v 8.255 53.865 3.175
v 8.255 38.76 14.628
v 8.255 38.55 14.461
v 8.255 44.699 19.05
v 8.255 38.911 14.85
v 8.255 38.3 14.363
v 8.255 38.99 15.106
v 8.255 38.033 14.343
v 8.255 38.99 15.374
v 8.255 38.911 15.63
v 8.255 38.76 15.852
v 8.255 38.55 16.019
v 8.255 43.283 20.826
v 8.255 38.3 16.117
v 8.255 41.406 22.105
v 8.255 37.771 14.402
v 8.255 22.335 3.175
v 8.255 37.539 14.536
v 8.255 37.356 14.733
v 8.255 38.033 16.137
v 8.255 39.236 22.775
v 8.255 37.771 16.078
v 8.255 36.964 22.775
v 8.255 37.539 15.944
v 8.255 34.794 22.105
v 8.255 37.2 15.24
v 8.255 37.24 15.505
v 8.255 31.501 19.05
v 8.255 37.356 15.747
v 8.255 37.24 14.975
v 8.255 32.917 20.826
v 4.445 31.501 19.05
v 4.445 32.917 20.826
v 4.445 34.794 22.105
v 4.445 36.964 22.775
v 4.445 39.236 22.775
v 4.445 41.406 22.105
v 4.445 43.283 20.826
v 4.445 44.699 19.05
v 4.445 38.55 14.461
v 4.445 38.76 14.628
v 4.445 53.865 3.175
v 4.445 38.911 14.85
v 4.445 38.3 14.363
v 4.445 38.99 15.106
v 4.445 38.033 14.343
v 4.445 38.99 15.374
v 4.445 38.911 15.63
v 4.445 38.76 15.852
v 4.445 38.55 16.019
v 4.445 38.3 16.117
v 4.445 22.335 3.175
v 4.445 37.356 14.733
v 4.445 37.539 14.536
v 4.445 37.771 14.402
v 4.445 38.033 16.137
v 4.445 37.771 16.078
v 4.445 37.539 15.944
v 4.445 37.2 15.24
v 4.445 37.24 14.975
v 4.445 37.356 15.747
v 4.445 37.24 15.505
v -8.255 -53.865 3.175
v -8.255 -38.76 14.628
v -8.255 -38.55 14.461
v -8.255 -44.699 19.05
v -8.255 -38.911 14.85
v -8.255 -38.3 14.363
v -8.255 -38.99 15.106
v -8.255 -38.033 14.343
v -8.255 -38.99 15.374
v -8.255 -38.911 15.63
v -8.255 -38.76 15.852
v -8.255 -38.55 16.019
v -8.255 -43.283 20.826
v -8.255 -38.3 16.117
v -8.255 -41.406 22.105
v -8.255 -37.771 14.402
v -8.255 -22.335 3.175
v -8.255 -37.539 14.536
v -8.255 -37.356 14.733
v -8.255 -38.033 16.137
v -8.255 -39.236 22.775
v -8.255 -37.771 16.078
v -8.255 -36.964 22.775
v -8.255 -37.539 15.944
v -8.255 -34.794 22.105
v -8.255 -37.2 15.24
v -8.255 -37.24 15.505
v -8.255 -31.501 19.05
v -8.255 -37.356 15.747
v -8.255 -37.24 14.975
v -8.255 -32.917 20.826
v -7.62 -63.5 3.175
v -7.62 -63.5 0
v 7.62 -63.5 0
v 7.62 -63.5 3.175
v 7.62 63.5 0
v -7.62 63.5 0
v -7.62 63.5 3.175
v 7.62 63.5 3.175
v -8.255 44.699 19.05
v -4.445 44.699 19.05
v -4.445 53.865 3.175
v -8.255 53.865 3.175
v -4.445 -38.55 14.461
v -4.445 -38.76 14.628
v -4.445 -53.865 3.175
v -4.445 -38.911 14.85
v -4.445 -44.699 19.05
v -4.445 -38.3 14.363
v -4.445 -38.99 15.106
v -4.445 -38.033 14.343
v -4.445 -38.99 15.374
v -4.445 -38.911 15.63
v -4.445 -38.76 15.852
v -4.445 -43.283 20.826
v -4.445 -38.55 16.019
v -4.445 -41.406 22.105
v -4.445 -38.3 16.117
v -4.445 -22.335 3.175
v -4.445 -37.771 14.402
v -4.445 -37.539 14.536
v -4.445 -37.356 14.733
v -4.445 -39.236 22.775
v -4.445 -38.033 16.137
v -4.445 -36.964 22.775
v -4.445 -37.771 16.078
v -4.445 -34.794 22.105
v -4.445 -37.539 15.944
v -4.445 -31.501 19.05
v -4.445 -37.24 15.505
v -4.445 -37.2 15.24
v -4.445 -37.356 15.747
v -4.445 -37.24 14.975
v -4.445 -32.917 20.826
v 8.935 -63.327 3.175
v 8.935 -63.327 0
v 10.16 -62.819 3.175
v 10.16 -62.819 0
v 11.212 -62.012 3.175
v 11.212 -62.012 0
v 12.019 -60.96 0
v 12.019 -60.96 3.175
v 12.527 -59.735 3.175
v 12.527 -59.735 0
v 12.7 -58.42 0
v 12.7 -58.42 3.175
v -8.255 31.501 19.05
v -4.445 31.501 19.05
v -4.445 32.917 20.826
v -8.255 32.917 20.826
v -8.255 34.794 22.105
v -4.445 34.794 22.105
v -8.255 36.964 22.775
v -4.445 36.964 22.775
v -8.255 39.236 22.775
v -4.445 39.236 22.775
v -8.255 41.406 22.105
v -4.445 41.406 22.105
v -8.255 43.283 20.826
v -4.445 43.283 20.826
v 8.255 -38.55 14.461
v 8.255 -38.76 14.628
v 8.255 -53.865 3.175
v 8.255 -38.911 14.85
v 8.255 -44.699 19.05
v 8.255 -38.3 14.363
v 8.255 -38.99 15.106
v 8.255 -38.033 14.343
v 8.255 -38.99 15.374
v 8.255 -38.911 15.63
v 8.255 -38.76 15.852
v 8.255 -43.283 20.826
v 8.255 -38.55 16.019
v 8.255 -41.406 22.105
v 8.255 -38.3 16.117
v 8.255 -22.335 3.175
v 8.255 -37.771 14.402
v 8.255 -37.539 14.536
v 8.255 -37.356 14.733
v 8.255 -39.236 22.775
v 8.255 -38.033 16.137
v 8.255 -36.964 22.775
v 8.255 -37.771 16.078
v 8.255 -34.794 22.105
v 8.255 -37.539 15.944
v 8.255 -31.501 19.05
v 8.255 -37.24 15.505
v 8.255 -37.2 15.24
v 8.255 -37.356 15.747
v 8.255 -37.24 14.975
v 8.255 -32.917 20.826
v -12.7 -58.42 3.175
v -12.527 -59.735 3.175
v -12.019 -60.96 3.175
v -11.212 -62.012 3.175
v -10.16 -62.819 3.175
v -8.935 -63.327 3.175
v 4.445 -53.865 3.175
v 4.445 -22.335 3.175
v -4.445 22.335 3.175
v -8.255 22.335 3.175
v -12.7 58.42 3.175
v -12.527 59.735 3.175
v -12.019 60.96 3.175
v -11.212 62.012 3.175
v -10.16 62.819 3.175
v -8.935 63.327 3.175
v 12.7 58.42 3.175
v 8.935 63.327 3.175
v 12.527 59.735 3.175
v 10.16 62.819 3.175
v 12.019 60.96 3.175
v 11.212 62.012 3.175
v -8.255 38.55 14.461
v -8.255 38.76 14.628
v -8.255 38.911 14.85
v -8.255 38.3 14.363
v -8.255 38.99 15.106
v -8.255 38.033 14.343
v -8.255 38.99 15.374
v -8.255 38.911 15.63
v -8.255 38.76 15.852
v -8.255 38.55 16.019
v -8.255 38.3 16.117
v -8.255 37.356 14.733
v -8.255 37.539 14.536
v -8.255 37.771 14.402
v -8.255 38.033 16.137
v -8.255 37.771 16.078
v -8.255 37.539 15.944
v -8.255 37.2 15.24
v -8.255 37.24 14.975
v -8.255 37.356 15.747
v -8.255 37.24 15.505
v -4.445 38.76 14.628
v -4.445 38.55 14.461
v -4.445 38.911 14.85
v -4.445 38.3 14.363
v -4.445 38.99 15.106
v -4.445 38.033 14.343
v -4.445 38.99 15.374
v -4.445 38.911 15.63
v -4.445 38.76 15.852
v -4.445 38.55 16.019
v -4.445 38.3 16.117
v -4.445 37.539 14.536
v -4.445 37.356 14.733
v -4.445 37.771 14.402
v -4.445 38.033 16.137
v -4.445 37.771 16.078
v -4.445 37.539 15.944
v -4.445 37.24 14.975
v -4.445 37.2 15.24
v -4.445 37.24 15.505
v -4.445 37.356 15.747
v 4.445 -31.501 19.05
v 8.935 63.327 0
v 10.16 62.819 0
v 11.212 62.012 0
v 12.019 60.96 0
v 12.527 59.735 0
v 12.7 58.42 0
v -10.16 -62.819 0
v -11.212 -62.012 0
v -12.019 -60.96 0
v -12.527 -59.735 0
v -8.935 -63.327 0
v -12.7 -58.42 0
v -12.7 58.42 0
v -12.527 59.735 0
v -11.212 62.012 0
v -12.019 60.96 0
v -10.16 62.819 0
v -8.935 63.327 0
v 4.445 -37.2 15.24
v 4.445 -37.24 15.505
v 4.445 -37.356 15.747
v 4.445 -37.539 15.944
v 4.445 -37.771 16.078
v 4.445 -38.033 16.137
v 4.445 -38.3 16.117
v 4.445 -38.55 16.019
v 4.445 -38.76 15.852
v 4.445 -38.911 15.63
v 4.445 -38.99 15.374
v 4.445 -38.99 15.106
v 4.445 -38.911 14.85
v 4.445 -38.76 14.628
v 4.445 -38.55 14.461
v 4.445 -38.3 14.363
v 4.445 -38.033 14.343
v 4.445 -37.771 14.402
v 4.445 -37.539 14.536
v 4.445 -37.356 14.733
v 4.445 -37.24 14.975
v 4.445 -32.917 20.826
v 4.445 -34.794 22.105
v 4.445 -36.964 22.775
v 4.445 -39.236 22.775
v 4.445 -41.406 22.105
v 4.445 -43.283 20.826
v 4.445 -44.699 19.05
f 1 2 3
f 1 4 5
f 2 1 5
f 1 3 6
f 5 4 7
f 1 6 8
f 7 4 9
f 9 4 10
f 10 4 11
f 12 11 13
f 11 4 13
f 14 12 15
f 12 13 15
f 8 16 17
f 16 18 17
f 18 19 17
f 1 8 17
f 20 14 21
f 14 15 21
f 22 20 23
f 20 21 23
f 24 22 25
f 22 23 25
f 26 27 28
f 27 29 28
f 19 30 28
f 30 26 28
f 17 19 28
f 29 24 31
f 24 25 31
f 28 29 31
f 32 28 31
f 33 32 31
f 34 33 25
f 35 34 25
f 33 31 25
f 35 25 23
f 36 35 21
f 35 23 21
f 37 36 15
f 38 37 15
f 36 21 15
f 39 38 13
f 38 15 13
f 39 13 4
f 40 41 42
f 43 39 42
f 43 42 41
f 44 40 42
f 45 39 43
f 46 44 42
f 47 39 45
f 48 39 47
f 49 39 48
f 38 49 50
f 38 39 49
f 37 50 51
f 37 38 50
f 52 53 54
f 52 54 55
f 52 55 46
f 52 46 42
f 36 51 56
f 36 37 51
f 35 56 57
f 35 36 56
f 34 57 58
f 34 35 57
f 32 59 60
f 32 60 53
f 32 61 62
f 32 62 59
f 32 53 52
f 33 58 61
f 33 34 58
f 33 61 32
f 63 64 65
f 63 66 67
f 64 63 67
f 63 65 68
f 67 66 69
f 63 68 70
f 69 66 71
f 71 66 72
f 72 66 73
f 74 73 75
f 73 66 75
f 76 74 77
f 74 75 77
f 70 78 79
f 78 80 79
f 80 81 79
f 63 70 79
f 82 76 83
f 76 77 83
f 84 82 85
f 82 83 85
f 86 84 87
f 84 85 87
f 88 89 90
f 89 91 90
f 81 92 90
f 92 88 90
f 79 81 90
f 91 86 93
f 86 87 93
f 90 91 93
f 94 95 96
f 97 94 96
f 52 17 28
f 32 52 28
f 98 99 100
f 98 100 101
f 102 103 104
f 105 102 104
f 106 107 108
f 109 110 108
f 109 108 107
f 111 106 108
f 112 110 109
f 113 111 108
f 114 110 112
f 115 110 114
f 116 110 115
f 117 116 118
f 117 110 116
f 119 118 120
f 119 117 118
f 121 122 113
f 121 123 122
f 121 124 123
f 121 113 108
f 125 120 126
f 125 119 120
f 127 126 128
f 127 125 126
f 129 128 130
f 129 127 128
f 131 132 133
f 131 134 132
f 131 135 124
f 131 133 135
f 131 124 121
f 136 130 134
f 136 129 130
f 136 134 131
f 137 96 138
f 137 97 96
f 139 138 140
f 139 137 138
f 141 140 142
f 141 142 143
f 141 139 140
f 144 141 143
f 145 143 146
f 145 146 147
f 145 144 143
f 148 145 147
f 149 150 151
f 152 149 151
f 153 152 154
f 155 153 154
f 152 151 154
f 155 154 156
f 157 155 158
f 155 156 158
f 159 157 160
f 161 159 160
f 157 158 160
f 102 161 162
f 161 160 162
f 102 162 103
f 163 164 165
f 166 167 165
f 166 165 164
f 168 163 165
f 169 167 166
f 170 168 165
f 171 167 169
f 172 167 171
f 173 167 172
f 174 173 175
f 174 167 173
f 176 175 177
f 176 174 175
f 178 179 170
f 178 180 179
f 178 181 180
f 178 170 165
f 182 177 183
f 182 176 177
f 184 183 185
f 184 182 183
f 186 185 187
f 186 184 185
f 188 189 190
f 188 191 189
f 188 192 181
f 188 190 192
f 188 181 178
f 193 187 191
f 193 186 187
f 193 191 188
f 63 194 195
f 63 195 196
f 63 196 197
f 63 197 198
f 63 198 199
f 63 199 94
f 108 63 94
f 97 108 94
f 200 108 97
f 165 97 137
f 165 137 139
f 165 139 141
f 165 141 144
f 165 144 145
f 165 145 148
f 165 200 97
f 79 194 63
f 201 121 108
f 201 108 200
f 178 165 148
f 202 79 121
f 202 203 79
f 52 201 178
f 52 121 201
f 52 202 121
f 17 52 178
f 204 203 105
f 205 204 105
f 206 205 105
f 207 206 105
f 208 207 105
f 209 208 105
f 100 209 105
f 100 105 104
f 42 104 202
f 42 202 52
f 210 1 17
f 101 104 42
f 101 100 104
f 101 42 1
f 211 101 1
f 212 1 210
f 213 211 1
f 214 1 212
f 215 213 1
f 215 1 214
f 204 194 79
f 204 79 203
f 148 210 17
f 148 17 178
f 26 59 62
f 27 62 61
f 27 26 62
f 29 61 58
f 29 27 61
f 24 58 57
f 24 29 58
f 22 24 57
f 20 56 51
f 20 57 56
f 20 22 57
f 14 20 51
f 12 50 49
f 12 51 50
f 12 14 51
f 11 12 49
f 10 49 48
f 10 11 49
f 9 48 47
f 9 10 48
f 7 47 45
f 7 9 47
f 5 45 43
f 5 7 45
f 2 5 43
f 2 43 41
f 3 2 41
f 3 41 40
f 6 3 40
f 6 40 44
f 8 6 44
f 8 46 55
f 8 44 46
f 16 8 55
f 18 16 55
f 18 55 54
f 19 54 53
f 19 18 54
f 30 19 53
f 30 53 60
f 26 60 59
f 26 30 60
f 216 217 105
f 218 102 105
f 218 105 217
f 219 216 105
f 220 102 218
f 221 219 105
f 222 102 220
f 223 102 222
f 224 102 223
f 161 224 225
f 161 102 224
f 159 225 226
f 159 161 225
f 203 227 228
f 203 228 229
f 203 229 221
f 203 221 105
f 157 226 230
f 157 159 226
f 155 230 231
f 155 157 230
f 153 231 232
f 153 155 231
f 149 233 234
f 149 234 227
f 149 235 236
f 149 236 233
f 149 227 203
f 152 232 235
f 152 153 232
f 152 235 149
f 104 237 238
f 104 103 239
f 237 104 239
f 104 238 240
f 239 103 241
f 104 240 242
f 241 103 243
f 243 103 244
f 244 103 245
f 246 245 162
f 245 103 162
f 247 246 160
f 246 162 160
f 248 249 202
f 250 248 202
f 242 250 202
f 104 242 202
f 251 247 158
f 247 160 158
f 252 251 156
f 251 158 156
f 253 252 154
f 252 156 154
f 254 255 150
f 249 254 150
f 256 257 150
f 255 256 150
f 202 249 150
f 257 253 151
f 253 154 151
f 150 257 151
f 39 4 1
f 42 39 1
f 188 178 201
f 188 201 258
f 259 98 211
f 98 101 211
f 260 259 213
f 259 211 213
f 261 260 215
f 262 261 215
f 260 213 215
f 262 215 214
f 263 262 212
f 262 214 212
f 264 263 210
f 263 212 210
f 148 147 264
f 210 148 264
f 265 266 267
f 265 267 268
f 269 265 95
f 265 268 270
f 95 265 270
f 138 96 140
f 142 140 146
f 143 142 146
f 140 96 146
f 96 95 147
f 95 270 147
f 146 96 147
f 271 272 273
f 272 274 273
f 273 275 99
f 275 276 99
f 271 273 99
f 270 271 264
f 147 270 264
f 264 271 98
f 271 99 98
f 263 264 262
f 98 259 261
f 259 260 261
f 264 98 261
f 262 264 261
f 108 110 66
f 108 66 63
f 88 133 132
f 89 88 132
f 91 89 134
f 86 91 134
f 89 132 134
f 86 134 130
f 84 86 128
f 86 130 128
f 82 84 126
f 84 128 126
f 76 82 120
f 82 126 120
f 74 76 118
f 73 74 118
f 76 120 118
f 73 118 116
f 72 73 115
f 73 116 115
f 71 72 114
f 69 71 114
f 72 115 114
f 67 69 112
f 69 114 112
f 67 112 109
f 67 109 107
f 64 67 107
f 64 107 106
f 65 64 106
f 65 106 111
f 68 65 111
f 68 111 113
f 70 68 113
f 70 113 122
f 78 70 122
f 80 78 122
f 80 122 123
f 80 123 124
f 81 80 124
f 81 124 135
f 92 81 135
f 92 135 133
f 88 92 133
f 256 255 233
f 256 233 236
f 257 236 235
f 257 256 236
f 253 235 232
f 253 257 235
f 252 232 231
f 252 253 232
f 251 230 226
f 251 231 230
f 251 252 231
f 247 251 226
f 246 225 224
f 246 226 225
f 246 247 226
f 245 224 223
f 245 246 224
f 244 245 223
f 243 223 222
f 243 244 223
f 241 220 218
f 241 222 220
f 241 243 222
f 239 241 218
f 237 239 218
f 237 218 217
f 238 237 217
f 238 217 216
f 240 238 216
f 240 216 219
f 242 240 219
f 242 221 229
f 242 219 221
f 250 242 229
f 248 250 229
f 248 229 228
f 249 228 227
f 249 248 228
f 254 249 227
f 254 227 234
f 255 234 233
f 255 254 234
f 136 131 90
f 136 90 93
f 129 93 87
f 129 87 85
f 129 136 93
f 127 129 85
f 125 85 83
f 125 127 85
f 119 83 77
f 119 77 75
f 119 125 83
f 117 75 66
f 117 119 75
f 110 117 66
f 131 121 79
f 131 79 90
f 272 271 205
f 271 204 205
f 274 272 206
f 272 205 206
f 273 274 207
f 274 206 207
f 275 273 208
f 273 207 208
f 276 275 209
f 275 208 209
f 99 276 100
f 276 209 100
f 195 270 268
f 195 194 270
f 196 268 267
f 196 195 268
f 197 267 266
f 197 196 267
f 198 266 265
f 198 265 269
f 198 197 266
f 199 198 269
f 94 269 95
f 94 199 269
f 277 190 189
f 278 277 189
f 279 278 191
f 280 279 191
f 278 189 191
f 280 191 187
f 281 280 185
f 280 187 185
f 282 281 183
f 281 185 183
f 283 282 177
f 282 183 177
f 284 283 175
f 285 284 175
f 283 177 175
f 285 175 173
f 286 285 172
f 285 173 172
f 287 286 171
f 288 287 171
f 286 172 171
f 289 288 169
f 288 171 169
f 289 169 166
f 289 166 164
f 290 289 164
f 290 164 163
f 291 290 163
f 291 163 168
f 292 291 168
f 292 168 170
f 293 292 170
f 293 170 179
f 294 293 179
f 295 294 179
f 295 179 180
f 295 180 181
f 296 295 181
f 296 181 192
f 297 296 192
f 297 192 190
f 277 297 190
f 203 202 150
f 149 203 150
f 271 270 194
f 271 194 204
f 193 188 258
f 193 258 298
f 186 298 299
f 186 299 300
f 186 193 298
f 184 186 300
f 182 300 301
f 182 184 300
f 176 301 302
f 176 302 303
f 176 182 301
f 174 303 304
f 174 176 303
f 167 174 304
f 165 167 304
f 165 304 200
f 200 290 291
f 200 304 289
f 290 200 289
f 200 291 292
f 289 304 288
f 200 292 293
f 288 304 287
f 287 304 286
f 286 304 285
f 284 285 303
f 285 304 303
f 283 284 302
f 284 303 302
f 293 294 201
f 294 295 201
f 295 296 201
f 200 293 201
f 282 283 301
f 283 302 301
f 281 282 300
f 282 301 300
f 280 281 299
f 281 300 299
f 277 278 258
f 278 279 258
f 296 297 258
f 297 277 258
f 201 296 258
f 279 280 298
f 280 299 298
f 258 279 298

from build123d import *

# Parameters (mm, degrees)
F0_W     = 25.4
F0_H     = 127
F1_DEPTH = 3.175
F3_DEPTH = 8.255
F4_DEPTH = 4.445
F5_R     = 0.9
F6_DEPTH = 20.956
F7_R     = 5.08


# Not quite as in the source:
# - a pattern or mirror of a feature is missing from the dataset's text; its kind, count and spacing are read off the source's solid


with BuildPart() as f1:
    # F0 (on Top) → F1 (new body)
    with BuildSketch(Plane.XY):
        Rectangle(F0_W, F0_H)
    extrude(amount=F1_DEPTH)

    # F2 (on Right) → F3 (join, symmetric)
    with BuildSketch(Plane.YZ):
        with BuildLine():
            Line((-44.6991135768, 19.05), (-53.8645491002, 3.175))
            Line((-53.8645491002, 3.175), (-22.3354508998, 3.175))
            Line((-22.3354508998, 3.175), (-31.5008864232, 19.05))
            ThreePointArc((-31.5008864232, 19.05), (-38.1, 22.86), (-44.6991135768, 19.05))
        make_face()
    f3 = extrude(amount=F3_DEPTH, both=True)

    # F3_copies: F3 across plane
    add(f3.mirror(Plane.ZX))

    # F2 (on Right) → F4 (cut, symmetric)
    with BuildSketch(Plane.YZ):
        with BuildLine():
            Line((-44.6991135768, 19.05), (-53.8645491002, 3.175))
            Line((-53.8645491002, 3.175), (-22.3354508998, 3.175))
            Line((-22.3354508998, 3.175), (-31.5008864232, 19.05))
            ThreePointArc((-31.5008864232, 19.05), (-38.1, 22.86), (-44.6991135768, 19.05))
        make_face()
    f4 = extrude(amount=F4_DEPTH, both=True, mode=Mode.SUBTRACT)

    # F4_copies: F4 across plane
    add(f4.mirror(Plane.ZX), mode=Mode.SUBTRACT)

    # F5 (on face) → F6 (cut, through all)
    with BuildSketch(Plane.YZ.offset(8.255)):
        with Locations((-38.1, 15.24)):
            Circle(F5_R)
    f6 = extrude(amount=-F6_DEPTH, mode=Mode.SUBTRACT)

    # F6_copies: F6 across plane
    add(f6.mirror(Plane.ZX), mode=Mode.SUBTRACT)

    # F7
    f7_edges = [f1.edges().sort_by_distance(p)[0] for p in [
        (12.7, -63.5, 1.5875),
        (-12.7, -63.5, 1.5875),
        (12.7, 63.5, 1.5875),
        (-12.7, 63.5, 1.5875),
    ]]
    fillet(f7_edges, radius=F7_R)


solid = f1.part
